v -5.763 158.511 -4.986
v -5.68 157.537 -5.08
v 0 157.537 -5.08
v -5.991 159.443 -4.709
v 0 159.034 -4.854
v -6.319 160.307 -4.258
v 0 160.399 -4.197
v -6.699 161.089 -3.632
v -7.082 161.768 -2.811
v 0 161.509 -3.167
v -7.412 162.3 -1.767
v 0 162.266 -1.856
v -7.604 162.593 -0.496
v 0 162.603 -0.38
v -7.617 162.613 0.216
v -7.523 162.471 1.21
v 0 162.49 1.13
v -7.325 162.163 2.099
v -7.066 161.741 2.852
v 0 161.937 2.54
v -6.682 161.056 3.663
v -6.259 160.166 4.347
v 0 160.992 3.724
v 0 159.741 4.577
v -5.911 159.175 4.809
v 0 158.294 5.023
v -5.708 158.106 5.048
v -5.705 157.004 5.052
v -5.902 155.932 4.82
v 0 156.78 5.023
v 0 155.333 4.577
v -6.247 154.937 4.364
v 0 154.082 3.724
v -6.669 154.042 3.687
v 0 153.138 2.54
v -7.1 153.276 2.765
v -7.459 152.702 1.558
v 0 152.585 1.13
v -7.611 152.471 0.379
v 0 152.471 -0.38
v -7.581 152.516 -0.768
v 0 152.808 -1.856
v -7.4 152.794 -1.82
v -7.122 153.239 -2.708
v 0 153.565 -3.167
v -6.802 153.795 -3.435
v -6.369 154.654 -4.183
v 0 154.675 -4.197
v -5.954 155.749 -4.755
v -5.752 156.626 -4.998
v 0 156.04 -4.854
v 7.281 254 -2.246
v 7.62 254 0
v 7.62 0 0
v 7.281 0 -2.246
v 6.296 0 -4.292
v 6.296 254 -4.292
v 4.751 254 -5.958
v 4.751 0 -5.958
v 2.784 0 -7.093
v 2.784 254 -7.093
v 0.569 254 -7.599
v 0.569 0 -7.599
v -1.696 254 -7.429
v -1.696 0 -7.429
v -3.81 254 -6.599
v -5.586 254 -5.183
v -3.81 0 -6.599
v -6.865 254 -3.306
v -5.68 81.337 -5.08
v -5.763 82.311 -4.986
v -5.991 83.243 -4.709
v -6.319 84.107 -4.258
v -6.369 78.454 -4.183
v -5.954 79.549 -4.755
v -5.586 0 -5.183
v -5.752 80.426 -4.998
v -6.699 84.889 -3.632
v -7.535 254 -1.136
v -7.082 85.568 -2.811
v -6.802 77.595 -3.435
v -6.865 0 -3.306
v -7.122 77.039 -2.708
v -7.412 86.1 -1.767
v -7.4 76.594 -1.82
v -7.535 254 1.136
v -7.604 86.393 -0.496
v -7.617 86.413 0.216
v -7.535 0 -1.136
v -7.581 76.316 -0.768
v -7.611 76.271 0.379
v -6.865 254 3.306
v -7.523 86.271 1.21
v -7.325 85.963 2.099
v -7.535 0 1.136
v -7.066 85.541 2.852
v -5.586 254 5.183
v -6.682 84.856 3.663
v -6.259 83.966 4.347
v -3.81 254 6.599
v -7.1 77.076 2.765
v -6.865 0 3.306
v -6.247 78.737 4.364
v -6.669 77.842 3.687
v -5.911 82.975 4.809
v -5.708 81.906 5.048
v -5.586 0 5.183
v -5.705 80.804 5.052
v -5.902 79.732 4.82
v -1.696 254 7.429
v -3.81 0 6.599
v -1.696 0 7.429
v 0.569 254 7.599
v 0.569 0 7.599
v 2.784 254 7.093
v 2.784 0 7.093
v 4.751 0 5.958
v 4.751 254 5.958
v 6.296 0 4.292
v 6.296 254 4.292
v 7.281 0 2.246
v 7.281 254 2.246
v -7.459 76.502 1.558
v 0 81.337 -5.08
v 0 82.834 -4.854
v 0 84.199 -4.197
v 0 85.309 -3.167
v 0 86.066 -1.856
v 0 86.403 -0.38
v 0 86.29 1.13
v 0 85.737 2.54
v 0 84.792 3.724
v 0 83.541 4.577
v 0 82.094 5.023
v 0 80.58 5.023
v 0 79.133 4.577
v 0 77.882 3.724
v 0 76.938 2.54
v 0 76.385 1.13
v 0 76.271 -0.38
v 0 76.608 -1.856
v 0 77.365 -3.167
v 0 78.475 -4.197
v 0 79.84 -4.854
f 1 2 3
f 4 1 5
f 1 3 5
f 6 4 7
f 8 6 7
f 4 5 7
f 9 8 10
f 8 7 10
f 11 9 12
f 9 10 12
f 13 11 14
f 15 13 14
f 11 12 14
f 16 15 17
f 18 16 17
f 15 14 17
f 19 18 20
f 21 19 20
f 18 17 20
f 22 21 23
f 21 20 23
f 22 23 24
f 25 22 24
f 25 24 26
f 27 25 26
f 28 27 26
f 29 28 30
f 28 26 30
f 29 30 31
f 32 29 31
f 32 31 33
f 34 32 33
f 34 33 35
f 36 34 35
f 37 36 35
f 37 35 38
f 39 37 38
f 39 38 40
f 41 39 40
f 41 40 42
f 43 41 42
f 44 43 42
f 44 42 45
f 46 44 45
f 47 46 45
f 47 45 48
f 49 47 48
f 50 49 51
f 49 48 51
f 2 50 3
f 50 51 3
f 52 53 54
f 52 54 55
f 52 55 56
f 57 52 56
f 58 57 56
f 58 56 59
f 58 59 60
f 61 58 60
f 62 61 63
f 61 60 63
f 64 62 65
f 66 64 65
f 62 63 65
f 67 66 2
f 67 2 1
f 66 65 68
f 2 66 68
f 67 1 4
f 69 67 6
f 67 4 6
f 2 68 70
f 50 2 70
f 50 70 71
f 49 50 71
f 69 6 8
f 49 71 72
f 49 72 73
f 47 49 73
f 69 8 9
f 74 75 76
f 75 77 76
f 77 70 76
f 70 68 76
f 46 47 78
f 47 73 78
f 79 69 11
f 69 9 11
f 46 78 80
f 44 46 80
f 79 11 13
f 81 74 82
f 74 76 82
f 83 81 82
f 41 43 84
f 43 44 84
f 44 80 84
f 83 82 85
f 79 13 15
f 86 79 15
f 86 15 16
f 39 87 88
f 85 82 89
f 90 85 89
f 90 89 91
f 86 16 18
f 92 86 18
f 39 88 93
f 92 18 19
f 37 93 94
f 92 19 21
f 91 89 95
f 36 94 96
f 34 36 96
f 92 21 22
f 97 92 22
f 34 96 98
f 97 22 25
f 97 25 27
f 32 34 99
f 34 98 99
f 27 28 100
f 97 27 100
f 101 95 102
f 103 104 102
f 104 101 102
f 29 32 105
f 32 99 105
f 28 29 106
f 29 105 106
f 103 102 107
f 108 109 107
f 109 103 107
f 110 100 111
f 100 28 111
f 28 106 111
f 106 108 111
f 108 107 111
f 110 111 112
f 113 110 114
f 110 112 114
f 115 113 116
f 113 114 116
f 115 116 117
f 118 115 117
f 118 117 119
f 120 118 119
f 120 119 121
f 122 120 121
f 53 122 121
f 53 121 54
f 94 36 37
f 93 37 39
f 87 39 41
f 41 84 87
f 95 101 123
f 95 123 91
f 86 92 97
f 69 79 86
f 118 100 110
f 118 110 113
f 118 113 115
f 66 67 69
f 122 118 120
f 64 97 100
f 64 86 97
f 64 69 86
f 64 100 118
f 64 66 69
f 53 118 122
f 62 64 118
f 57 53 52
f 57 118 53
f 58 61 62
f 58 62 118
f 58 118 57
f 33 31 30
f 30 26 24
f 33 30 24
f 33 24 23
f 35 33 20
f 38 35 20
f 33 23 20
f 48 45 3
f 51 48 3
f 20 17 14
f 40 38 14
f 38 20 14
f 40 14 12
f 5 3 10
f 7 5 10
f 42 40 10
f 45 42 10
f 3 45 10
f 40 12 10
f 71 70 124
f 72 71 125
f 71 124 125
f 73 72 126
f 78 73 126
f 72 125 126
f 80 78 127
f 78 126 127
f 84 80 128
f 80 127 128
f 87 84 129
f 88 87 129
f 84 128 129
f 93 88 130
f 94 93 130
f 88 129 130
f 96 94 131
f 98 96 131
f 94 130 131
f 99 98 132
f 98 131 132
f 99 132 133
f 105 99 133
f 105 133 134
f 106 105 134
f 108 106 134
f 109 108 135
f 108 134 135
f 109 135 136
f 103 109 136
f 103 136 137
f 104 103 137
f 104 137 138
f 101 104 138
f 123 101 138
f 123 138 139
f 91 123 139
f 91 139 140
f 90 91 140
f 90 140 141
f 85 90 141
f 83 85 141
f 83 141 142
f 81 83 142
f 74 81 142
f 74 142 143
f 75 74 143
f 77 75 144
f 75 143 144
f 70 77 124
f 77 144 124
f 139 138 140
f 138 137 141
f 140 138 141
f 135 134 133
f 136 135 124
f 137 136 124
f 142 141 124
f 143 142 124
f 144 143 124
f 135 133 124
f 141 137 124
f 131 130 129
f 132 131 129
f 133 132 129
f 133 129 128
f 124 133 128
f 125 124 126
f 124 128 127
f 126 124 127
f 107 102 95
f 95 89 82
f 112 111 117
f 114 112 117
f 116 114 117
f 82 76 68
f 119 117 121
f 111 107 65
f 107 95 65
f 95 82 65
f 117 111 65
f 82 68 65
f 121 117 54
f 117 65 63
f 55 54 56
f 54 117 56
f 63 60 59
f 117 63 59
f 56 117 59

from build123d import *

# Parameters (mm, degrees)
SKETCH2_R           = 7.62
BOSS_EXTRUDE2_DEPTH = 254
SKETCH3_R           = 5.08
CUT_EXTRUDE1_DEPTH  = 8.62


with BuildPart() as part:
    # Sketch2 → Boss-Extrude2 (new body)
    with BuildSketch(Plane(origin=(0, 0, 0), x_dir=(1, 0, 0), z_dir=(0, 1, 0))):
        Circle(SKETCH2_R)
    extrude(amount=BOSS_EXTRUDE2_DEPTH)

    # Sketch3 → Cut-Extrude1 (cut, through all)
    with BuildSketch(Plane(origin=(0, 0, 0), x_dir=(0, 0, -1), z_dir=(1, 0, 0))):
        with Locations((0, 157.537141192)):
            Circle(SKETCH3_R)
        with Locations((0, 81.337141192)):
            Circle(SKETCH3_R)
    extrude(amount=-CUT_EXTRUDE1_DEPTH, mode=Mode.SUBTRACT)


solid = part.part
